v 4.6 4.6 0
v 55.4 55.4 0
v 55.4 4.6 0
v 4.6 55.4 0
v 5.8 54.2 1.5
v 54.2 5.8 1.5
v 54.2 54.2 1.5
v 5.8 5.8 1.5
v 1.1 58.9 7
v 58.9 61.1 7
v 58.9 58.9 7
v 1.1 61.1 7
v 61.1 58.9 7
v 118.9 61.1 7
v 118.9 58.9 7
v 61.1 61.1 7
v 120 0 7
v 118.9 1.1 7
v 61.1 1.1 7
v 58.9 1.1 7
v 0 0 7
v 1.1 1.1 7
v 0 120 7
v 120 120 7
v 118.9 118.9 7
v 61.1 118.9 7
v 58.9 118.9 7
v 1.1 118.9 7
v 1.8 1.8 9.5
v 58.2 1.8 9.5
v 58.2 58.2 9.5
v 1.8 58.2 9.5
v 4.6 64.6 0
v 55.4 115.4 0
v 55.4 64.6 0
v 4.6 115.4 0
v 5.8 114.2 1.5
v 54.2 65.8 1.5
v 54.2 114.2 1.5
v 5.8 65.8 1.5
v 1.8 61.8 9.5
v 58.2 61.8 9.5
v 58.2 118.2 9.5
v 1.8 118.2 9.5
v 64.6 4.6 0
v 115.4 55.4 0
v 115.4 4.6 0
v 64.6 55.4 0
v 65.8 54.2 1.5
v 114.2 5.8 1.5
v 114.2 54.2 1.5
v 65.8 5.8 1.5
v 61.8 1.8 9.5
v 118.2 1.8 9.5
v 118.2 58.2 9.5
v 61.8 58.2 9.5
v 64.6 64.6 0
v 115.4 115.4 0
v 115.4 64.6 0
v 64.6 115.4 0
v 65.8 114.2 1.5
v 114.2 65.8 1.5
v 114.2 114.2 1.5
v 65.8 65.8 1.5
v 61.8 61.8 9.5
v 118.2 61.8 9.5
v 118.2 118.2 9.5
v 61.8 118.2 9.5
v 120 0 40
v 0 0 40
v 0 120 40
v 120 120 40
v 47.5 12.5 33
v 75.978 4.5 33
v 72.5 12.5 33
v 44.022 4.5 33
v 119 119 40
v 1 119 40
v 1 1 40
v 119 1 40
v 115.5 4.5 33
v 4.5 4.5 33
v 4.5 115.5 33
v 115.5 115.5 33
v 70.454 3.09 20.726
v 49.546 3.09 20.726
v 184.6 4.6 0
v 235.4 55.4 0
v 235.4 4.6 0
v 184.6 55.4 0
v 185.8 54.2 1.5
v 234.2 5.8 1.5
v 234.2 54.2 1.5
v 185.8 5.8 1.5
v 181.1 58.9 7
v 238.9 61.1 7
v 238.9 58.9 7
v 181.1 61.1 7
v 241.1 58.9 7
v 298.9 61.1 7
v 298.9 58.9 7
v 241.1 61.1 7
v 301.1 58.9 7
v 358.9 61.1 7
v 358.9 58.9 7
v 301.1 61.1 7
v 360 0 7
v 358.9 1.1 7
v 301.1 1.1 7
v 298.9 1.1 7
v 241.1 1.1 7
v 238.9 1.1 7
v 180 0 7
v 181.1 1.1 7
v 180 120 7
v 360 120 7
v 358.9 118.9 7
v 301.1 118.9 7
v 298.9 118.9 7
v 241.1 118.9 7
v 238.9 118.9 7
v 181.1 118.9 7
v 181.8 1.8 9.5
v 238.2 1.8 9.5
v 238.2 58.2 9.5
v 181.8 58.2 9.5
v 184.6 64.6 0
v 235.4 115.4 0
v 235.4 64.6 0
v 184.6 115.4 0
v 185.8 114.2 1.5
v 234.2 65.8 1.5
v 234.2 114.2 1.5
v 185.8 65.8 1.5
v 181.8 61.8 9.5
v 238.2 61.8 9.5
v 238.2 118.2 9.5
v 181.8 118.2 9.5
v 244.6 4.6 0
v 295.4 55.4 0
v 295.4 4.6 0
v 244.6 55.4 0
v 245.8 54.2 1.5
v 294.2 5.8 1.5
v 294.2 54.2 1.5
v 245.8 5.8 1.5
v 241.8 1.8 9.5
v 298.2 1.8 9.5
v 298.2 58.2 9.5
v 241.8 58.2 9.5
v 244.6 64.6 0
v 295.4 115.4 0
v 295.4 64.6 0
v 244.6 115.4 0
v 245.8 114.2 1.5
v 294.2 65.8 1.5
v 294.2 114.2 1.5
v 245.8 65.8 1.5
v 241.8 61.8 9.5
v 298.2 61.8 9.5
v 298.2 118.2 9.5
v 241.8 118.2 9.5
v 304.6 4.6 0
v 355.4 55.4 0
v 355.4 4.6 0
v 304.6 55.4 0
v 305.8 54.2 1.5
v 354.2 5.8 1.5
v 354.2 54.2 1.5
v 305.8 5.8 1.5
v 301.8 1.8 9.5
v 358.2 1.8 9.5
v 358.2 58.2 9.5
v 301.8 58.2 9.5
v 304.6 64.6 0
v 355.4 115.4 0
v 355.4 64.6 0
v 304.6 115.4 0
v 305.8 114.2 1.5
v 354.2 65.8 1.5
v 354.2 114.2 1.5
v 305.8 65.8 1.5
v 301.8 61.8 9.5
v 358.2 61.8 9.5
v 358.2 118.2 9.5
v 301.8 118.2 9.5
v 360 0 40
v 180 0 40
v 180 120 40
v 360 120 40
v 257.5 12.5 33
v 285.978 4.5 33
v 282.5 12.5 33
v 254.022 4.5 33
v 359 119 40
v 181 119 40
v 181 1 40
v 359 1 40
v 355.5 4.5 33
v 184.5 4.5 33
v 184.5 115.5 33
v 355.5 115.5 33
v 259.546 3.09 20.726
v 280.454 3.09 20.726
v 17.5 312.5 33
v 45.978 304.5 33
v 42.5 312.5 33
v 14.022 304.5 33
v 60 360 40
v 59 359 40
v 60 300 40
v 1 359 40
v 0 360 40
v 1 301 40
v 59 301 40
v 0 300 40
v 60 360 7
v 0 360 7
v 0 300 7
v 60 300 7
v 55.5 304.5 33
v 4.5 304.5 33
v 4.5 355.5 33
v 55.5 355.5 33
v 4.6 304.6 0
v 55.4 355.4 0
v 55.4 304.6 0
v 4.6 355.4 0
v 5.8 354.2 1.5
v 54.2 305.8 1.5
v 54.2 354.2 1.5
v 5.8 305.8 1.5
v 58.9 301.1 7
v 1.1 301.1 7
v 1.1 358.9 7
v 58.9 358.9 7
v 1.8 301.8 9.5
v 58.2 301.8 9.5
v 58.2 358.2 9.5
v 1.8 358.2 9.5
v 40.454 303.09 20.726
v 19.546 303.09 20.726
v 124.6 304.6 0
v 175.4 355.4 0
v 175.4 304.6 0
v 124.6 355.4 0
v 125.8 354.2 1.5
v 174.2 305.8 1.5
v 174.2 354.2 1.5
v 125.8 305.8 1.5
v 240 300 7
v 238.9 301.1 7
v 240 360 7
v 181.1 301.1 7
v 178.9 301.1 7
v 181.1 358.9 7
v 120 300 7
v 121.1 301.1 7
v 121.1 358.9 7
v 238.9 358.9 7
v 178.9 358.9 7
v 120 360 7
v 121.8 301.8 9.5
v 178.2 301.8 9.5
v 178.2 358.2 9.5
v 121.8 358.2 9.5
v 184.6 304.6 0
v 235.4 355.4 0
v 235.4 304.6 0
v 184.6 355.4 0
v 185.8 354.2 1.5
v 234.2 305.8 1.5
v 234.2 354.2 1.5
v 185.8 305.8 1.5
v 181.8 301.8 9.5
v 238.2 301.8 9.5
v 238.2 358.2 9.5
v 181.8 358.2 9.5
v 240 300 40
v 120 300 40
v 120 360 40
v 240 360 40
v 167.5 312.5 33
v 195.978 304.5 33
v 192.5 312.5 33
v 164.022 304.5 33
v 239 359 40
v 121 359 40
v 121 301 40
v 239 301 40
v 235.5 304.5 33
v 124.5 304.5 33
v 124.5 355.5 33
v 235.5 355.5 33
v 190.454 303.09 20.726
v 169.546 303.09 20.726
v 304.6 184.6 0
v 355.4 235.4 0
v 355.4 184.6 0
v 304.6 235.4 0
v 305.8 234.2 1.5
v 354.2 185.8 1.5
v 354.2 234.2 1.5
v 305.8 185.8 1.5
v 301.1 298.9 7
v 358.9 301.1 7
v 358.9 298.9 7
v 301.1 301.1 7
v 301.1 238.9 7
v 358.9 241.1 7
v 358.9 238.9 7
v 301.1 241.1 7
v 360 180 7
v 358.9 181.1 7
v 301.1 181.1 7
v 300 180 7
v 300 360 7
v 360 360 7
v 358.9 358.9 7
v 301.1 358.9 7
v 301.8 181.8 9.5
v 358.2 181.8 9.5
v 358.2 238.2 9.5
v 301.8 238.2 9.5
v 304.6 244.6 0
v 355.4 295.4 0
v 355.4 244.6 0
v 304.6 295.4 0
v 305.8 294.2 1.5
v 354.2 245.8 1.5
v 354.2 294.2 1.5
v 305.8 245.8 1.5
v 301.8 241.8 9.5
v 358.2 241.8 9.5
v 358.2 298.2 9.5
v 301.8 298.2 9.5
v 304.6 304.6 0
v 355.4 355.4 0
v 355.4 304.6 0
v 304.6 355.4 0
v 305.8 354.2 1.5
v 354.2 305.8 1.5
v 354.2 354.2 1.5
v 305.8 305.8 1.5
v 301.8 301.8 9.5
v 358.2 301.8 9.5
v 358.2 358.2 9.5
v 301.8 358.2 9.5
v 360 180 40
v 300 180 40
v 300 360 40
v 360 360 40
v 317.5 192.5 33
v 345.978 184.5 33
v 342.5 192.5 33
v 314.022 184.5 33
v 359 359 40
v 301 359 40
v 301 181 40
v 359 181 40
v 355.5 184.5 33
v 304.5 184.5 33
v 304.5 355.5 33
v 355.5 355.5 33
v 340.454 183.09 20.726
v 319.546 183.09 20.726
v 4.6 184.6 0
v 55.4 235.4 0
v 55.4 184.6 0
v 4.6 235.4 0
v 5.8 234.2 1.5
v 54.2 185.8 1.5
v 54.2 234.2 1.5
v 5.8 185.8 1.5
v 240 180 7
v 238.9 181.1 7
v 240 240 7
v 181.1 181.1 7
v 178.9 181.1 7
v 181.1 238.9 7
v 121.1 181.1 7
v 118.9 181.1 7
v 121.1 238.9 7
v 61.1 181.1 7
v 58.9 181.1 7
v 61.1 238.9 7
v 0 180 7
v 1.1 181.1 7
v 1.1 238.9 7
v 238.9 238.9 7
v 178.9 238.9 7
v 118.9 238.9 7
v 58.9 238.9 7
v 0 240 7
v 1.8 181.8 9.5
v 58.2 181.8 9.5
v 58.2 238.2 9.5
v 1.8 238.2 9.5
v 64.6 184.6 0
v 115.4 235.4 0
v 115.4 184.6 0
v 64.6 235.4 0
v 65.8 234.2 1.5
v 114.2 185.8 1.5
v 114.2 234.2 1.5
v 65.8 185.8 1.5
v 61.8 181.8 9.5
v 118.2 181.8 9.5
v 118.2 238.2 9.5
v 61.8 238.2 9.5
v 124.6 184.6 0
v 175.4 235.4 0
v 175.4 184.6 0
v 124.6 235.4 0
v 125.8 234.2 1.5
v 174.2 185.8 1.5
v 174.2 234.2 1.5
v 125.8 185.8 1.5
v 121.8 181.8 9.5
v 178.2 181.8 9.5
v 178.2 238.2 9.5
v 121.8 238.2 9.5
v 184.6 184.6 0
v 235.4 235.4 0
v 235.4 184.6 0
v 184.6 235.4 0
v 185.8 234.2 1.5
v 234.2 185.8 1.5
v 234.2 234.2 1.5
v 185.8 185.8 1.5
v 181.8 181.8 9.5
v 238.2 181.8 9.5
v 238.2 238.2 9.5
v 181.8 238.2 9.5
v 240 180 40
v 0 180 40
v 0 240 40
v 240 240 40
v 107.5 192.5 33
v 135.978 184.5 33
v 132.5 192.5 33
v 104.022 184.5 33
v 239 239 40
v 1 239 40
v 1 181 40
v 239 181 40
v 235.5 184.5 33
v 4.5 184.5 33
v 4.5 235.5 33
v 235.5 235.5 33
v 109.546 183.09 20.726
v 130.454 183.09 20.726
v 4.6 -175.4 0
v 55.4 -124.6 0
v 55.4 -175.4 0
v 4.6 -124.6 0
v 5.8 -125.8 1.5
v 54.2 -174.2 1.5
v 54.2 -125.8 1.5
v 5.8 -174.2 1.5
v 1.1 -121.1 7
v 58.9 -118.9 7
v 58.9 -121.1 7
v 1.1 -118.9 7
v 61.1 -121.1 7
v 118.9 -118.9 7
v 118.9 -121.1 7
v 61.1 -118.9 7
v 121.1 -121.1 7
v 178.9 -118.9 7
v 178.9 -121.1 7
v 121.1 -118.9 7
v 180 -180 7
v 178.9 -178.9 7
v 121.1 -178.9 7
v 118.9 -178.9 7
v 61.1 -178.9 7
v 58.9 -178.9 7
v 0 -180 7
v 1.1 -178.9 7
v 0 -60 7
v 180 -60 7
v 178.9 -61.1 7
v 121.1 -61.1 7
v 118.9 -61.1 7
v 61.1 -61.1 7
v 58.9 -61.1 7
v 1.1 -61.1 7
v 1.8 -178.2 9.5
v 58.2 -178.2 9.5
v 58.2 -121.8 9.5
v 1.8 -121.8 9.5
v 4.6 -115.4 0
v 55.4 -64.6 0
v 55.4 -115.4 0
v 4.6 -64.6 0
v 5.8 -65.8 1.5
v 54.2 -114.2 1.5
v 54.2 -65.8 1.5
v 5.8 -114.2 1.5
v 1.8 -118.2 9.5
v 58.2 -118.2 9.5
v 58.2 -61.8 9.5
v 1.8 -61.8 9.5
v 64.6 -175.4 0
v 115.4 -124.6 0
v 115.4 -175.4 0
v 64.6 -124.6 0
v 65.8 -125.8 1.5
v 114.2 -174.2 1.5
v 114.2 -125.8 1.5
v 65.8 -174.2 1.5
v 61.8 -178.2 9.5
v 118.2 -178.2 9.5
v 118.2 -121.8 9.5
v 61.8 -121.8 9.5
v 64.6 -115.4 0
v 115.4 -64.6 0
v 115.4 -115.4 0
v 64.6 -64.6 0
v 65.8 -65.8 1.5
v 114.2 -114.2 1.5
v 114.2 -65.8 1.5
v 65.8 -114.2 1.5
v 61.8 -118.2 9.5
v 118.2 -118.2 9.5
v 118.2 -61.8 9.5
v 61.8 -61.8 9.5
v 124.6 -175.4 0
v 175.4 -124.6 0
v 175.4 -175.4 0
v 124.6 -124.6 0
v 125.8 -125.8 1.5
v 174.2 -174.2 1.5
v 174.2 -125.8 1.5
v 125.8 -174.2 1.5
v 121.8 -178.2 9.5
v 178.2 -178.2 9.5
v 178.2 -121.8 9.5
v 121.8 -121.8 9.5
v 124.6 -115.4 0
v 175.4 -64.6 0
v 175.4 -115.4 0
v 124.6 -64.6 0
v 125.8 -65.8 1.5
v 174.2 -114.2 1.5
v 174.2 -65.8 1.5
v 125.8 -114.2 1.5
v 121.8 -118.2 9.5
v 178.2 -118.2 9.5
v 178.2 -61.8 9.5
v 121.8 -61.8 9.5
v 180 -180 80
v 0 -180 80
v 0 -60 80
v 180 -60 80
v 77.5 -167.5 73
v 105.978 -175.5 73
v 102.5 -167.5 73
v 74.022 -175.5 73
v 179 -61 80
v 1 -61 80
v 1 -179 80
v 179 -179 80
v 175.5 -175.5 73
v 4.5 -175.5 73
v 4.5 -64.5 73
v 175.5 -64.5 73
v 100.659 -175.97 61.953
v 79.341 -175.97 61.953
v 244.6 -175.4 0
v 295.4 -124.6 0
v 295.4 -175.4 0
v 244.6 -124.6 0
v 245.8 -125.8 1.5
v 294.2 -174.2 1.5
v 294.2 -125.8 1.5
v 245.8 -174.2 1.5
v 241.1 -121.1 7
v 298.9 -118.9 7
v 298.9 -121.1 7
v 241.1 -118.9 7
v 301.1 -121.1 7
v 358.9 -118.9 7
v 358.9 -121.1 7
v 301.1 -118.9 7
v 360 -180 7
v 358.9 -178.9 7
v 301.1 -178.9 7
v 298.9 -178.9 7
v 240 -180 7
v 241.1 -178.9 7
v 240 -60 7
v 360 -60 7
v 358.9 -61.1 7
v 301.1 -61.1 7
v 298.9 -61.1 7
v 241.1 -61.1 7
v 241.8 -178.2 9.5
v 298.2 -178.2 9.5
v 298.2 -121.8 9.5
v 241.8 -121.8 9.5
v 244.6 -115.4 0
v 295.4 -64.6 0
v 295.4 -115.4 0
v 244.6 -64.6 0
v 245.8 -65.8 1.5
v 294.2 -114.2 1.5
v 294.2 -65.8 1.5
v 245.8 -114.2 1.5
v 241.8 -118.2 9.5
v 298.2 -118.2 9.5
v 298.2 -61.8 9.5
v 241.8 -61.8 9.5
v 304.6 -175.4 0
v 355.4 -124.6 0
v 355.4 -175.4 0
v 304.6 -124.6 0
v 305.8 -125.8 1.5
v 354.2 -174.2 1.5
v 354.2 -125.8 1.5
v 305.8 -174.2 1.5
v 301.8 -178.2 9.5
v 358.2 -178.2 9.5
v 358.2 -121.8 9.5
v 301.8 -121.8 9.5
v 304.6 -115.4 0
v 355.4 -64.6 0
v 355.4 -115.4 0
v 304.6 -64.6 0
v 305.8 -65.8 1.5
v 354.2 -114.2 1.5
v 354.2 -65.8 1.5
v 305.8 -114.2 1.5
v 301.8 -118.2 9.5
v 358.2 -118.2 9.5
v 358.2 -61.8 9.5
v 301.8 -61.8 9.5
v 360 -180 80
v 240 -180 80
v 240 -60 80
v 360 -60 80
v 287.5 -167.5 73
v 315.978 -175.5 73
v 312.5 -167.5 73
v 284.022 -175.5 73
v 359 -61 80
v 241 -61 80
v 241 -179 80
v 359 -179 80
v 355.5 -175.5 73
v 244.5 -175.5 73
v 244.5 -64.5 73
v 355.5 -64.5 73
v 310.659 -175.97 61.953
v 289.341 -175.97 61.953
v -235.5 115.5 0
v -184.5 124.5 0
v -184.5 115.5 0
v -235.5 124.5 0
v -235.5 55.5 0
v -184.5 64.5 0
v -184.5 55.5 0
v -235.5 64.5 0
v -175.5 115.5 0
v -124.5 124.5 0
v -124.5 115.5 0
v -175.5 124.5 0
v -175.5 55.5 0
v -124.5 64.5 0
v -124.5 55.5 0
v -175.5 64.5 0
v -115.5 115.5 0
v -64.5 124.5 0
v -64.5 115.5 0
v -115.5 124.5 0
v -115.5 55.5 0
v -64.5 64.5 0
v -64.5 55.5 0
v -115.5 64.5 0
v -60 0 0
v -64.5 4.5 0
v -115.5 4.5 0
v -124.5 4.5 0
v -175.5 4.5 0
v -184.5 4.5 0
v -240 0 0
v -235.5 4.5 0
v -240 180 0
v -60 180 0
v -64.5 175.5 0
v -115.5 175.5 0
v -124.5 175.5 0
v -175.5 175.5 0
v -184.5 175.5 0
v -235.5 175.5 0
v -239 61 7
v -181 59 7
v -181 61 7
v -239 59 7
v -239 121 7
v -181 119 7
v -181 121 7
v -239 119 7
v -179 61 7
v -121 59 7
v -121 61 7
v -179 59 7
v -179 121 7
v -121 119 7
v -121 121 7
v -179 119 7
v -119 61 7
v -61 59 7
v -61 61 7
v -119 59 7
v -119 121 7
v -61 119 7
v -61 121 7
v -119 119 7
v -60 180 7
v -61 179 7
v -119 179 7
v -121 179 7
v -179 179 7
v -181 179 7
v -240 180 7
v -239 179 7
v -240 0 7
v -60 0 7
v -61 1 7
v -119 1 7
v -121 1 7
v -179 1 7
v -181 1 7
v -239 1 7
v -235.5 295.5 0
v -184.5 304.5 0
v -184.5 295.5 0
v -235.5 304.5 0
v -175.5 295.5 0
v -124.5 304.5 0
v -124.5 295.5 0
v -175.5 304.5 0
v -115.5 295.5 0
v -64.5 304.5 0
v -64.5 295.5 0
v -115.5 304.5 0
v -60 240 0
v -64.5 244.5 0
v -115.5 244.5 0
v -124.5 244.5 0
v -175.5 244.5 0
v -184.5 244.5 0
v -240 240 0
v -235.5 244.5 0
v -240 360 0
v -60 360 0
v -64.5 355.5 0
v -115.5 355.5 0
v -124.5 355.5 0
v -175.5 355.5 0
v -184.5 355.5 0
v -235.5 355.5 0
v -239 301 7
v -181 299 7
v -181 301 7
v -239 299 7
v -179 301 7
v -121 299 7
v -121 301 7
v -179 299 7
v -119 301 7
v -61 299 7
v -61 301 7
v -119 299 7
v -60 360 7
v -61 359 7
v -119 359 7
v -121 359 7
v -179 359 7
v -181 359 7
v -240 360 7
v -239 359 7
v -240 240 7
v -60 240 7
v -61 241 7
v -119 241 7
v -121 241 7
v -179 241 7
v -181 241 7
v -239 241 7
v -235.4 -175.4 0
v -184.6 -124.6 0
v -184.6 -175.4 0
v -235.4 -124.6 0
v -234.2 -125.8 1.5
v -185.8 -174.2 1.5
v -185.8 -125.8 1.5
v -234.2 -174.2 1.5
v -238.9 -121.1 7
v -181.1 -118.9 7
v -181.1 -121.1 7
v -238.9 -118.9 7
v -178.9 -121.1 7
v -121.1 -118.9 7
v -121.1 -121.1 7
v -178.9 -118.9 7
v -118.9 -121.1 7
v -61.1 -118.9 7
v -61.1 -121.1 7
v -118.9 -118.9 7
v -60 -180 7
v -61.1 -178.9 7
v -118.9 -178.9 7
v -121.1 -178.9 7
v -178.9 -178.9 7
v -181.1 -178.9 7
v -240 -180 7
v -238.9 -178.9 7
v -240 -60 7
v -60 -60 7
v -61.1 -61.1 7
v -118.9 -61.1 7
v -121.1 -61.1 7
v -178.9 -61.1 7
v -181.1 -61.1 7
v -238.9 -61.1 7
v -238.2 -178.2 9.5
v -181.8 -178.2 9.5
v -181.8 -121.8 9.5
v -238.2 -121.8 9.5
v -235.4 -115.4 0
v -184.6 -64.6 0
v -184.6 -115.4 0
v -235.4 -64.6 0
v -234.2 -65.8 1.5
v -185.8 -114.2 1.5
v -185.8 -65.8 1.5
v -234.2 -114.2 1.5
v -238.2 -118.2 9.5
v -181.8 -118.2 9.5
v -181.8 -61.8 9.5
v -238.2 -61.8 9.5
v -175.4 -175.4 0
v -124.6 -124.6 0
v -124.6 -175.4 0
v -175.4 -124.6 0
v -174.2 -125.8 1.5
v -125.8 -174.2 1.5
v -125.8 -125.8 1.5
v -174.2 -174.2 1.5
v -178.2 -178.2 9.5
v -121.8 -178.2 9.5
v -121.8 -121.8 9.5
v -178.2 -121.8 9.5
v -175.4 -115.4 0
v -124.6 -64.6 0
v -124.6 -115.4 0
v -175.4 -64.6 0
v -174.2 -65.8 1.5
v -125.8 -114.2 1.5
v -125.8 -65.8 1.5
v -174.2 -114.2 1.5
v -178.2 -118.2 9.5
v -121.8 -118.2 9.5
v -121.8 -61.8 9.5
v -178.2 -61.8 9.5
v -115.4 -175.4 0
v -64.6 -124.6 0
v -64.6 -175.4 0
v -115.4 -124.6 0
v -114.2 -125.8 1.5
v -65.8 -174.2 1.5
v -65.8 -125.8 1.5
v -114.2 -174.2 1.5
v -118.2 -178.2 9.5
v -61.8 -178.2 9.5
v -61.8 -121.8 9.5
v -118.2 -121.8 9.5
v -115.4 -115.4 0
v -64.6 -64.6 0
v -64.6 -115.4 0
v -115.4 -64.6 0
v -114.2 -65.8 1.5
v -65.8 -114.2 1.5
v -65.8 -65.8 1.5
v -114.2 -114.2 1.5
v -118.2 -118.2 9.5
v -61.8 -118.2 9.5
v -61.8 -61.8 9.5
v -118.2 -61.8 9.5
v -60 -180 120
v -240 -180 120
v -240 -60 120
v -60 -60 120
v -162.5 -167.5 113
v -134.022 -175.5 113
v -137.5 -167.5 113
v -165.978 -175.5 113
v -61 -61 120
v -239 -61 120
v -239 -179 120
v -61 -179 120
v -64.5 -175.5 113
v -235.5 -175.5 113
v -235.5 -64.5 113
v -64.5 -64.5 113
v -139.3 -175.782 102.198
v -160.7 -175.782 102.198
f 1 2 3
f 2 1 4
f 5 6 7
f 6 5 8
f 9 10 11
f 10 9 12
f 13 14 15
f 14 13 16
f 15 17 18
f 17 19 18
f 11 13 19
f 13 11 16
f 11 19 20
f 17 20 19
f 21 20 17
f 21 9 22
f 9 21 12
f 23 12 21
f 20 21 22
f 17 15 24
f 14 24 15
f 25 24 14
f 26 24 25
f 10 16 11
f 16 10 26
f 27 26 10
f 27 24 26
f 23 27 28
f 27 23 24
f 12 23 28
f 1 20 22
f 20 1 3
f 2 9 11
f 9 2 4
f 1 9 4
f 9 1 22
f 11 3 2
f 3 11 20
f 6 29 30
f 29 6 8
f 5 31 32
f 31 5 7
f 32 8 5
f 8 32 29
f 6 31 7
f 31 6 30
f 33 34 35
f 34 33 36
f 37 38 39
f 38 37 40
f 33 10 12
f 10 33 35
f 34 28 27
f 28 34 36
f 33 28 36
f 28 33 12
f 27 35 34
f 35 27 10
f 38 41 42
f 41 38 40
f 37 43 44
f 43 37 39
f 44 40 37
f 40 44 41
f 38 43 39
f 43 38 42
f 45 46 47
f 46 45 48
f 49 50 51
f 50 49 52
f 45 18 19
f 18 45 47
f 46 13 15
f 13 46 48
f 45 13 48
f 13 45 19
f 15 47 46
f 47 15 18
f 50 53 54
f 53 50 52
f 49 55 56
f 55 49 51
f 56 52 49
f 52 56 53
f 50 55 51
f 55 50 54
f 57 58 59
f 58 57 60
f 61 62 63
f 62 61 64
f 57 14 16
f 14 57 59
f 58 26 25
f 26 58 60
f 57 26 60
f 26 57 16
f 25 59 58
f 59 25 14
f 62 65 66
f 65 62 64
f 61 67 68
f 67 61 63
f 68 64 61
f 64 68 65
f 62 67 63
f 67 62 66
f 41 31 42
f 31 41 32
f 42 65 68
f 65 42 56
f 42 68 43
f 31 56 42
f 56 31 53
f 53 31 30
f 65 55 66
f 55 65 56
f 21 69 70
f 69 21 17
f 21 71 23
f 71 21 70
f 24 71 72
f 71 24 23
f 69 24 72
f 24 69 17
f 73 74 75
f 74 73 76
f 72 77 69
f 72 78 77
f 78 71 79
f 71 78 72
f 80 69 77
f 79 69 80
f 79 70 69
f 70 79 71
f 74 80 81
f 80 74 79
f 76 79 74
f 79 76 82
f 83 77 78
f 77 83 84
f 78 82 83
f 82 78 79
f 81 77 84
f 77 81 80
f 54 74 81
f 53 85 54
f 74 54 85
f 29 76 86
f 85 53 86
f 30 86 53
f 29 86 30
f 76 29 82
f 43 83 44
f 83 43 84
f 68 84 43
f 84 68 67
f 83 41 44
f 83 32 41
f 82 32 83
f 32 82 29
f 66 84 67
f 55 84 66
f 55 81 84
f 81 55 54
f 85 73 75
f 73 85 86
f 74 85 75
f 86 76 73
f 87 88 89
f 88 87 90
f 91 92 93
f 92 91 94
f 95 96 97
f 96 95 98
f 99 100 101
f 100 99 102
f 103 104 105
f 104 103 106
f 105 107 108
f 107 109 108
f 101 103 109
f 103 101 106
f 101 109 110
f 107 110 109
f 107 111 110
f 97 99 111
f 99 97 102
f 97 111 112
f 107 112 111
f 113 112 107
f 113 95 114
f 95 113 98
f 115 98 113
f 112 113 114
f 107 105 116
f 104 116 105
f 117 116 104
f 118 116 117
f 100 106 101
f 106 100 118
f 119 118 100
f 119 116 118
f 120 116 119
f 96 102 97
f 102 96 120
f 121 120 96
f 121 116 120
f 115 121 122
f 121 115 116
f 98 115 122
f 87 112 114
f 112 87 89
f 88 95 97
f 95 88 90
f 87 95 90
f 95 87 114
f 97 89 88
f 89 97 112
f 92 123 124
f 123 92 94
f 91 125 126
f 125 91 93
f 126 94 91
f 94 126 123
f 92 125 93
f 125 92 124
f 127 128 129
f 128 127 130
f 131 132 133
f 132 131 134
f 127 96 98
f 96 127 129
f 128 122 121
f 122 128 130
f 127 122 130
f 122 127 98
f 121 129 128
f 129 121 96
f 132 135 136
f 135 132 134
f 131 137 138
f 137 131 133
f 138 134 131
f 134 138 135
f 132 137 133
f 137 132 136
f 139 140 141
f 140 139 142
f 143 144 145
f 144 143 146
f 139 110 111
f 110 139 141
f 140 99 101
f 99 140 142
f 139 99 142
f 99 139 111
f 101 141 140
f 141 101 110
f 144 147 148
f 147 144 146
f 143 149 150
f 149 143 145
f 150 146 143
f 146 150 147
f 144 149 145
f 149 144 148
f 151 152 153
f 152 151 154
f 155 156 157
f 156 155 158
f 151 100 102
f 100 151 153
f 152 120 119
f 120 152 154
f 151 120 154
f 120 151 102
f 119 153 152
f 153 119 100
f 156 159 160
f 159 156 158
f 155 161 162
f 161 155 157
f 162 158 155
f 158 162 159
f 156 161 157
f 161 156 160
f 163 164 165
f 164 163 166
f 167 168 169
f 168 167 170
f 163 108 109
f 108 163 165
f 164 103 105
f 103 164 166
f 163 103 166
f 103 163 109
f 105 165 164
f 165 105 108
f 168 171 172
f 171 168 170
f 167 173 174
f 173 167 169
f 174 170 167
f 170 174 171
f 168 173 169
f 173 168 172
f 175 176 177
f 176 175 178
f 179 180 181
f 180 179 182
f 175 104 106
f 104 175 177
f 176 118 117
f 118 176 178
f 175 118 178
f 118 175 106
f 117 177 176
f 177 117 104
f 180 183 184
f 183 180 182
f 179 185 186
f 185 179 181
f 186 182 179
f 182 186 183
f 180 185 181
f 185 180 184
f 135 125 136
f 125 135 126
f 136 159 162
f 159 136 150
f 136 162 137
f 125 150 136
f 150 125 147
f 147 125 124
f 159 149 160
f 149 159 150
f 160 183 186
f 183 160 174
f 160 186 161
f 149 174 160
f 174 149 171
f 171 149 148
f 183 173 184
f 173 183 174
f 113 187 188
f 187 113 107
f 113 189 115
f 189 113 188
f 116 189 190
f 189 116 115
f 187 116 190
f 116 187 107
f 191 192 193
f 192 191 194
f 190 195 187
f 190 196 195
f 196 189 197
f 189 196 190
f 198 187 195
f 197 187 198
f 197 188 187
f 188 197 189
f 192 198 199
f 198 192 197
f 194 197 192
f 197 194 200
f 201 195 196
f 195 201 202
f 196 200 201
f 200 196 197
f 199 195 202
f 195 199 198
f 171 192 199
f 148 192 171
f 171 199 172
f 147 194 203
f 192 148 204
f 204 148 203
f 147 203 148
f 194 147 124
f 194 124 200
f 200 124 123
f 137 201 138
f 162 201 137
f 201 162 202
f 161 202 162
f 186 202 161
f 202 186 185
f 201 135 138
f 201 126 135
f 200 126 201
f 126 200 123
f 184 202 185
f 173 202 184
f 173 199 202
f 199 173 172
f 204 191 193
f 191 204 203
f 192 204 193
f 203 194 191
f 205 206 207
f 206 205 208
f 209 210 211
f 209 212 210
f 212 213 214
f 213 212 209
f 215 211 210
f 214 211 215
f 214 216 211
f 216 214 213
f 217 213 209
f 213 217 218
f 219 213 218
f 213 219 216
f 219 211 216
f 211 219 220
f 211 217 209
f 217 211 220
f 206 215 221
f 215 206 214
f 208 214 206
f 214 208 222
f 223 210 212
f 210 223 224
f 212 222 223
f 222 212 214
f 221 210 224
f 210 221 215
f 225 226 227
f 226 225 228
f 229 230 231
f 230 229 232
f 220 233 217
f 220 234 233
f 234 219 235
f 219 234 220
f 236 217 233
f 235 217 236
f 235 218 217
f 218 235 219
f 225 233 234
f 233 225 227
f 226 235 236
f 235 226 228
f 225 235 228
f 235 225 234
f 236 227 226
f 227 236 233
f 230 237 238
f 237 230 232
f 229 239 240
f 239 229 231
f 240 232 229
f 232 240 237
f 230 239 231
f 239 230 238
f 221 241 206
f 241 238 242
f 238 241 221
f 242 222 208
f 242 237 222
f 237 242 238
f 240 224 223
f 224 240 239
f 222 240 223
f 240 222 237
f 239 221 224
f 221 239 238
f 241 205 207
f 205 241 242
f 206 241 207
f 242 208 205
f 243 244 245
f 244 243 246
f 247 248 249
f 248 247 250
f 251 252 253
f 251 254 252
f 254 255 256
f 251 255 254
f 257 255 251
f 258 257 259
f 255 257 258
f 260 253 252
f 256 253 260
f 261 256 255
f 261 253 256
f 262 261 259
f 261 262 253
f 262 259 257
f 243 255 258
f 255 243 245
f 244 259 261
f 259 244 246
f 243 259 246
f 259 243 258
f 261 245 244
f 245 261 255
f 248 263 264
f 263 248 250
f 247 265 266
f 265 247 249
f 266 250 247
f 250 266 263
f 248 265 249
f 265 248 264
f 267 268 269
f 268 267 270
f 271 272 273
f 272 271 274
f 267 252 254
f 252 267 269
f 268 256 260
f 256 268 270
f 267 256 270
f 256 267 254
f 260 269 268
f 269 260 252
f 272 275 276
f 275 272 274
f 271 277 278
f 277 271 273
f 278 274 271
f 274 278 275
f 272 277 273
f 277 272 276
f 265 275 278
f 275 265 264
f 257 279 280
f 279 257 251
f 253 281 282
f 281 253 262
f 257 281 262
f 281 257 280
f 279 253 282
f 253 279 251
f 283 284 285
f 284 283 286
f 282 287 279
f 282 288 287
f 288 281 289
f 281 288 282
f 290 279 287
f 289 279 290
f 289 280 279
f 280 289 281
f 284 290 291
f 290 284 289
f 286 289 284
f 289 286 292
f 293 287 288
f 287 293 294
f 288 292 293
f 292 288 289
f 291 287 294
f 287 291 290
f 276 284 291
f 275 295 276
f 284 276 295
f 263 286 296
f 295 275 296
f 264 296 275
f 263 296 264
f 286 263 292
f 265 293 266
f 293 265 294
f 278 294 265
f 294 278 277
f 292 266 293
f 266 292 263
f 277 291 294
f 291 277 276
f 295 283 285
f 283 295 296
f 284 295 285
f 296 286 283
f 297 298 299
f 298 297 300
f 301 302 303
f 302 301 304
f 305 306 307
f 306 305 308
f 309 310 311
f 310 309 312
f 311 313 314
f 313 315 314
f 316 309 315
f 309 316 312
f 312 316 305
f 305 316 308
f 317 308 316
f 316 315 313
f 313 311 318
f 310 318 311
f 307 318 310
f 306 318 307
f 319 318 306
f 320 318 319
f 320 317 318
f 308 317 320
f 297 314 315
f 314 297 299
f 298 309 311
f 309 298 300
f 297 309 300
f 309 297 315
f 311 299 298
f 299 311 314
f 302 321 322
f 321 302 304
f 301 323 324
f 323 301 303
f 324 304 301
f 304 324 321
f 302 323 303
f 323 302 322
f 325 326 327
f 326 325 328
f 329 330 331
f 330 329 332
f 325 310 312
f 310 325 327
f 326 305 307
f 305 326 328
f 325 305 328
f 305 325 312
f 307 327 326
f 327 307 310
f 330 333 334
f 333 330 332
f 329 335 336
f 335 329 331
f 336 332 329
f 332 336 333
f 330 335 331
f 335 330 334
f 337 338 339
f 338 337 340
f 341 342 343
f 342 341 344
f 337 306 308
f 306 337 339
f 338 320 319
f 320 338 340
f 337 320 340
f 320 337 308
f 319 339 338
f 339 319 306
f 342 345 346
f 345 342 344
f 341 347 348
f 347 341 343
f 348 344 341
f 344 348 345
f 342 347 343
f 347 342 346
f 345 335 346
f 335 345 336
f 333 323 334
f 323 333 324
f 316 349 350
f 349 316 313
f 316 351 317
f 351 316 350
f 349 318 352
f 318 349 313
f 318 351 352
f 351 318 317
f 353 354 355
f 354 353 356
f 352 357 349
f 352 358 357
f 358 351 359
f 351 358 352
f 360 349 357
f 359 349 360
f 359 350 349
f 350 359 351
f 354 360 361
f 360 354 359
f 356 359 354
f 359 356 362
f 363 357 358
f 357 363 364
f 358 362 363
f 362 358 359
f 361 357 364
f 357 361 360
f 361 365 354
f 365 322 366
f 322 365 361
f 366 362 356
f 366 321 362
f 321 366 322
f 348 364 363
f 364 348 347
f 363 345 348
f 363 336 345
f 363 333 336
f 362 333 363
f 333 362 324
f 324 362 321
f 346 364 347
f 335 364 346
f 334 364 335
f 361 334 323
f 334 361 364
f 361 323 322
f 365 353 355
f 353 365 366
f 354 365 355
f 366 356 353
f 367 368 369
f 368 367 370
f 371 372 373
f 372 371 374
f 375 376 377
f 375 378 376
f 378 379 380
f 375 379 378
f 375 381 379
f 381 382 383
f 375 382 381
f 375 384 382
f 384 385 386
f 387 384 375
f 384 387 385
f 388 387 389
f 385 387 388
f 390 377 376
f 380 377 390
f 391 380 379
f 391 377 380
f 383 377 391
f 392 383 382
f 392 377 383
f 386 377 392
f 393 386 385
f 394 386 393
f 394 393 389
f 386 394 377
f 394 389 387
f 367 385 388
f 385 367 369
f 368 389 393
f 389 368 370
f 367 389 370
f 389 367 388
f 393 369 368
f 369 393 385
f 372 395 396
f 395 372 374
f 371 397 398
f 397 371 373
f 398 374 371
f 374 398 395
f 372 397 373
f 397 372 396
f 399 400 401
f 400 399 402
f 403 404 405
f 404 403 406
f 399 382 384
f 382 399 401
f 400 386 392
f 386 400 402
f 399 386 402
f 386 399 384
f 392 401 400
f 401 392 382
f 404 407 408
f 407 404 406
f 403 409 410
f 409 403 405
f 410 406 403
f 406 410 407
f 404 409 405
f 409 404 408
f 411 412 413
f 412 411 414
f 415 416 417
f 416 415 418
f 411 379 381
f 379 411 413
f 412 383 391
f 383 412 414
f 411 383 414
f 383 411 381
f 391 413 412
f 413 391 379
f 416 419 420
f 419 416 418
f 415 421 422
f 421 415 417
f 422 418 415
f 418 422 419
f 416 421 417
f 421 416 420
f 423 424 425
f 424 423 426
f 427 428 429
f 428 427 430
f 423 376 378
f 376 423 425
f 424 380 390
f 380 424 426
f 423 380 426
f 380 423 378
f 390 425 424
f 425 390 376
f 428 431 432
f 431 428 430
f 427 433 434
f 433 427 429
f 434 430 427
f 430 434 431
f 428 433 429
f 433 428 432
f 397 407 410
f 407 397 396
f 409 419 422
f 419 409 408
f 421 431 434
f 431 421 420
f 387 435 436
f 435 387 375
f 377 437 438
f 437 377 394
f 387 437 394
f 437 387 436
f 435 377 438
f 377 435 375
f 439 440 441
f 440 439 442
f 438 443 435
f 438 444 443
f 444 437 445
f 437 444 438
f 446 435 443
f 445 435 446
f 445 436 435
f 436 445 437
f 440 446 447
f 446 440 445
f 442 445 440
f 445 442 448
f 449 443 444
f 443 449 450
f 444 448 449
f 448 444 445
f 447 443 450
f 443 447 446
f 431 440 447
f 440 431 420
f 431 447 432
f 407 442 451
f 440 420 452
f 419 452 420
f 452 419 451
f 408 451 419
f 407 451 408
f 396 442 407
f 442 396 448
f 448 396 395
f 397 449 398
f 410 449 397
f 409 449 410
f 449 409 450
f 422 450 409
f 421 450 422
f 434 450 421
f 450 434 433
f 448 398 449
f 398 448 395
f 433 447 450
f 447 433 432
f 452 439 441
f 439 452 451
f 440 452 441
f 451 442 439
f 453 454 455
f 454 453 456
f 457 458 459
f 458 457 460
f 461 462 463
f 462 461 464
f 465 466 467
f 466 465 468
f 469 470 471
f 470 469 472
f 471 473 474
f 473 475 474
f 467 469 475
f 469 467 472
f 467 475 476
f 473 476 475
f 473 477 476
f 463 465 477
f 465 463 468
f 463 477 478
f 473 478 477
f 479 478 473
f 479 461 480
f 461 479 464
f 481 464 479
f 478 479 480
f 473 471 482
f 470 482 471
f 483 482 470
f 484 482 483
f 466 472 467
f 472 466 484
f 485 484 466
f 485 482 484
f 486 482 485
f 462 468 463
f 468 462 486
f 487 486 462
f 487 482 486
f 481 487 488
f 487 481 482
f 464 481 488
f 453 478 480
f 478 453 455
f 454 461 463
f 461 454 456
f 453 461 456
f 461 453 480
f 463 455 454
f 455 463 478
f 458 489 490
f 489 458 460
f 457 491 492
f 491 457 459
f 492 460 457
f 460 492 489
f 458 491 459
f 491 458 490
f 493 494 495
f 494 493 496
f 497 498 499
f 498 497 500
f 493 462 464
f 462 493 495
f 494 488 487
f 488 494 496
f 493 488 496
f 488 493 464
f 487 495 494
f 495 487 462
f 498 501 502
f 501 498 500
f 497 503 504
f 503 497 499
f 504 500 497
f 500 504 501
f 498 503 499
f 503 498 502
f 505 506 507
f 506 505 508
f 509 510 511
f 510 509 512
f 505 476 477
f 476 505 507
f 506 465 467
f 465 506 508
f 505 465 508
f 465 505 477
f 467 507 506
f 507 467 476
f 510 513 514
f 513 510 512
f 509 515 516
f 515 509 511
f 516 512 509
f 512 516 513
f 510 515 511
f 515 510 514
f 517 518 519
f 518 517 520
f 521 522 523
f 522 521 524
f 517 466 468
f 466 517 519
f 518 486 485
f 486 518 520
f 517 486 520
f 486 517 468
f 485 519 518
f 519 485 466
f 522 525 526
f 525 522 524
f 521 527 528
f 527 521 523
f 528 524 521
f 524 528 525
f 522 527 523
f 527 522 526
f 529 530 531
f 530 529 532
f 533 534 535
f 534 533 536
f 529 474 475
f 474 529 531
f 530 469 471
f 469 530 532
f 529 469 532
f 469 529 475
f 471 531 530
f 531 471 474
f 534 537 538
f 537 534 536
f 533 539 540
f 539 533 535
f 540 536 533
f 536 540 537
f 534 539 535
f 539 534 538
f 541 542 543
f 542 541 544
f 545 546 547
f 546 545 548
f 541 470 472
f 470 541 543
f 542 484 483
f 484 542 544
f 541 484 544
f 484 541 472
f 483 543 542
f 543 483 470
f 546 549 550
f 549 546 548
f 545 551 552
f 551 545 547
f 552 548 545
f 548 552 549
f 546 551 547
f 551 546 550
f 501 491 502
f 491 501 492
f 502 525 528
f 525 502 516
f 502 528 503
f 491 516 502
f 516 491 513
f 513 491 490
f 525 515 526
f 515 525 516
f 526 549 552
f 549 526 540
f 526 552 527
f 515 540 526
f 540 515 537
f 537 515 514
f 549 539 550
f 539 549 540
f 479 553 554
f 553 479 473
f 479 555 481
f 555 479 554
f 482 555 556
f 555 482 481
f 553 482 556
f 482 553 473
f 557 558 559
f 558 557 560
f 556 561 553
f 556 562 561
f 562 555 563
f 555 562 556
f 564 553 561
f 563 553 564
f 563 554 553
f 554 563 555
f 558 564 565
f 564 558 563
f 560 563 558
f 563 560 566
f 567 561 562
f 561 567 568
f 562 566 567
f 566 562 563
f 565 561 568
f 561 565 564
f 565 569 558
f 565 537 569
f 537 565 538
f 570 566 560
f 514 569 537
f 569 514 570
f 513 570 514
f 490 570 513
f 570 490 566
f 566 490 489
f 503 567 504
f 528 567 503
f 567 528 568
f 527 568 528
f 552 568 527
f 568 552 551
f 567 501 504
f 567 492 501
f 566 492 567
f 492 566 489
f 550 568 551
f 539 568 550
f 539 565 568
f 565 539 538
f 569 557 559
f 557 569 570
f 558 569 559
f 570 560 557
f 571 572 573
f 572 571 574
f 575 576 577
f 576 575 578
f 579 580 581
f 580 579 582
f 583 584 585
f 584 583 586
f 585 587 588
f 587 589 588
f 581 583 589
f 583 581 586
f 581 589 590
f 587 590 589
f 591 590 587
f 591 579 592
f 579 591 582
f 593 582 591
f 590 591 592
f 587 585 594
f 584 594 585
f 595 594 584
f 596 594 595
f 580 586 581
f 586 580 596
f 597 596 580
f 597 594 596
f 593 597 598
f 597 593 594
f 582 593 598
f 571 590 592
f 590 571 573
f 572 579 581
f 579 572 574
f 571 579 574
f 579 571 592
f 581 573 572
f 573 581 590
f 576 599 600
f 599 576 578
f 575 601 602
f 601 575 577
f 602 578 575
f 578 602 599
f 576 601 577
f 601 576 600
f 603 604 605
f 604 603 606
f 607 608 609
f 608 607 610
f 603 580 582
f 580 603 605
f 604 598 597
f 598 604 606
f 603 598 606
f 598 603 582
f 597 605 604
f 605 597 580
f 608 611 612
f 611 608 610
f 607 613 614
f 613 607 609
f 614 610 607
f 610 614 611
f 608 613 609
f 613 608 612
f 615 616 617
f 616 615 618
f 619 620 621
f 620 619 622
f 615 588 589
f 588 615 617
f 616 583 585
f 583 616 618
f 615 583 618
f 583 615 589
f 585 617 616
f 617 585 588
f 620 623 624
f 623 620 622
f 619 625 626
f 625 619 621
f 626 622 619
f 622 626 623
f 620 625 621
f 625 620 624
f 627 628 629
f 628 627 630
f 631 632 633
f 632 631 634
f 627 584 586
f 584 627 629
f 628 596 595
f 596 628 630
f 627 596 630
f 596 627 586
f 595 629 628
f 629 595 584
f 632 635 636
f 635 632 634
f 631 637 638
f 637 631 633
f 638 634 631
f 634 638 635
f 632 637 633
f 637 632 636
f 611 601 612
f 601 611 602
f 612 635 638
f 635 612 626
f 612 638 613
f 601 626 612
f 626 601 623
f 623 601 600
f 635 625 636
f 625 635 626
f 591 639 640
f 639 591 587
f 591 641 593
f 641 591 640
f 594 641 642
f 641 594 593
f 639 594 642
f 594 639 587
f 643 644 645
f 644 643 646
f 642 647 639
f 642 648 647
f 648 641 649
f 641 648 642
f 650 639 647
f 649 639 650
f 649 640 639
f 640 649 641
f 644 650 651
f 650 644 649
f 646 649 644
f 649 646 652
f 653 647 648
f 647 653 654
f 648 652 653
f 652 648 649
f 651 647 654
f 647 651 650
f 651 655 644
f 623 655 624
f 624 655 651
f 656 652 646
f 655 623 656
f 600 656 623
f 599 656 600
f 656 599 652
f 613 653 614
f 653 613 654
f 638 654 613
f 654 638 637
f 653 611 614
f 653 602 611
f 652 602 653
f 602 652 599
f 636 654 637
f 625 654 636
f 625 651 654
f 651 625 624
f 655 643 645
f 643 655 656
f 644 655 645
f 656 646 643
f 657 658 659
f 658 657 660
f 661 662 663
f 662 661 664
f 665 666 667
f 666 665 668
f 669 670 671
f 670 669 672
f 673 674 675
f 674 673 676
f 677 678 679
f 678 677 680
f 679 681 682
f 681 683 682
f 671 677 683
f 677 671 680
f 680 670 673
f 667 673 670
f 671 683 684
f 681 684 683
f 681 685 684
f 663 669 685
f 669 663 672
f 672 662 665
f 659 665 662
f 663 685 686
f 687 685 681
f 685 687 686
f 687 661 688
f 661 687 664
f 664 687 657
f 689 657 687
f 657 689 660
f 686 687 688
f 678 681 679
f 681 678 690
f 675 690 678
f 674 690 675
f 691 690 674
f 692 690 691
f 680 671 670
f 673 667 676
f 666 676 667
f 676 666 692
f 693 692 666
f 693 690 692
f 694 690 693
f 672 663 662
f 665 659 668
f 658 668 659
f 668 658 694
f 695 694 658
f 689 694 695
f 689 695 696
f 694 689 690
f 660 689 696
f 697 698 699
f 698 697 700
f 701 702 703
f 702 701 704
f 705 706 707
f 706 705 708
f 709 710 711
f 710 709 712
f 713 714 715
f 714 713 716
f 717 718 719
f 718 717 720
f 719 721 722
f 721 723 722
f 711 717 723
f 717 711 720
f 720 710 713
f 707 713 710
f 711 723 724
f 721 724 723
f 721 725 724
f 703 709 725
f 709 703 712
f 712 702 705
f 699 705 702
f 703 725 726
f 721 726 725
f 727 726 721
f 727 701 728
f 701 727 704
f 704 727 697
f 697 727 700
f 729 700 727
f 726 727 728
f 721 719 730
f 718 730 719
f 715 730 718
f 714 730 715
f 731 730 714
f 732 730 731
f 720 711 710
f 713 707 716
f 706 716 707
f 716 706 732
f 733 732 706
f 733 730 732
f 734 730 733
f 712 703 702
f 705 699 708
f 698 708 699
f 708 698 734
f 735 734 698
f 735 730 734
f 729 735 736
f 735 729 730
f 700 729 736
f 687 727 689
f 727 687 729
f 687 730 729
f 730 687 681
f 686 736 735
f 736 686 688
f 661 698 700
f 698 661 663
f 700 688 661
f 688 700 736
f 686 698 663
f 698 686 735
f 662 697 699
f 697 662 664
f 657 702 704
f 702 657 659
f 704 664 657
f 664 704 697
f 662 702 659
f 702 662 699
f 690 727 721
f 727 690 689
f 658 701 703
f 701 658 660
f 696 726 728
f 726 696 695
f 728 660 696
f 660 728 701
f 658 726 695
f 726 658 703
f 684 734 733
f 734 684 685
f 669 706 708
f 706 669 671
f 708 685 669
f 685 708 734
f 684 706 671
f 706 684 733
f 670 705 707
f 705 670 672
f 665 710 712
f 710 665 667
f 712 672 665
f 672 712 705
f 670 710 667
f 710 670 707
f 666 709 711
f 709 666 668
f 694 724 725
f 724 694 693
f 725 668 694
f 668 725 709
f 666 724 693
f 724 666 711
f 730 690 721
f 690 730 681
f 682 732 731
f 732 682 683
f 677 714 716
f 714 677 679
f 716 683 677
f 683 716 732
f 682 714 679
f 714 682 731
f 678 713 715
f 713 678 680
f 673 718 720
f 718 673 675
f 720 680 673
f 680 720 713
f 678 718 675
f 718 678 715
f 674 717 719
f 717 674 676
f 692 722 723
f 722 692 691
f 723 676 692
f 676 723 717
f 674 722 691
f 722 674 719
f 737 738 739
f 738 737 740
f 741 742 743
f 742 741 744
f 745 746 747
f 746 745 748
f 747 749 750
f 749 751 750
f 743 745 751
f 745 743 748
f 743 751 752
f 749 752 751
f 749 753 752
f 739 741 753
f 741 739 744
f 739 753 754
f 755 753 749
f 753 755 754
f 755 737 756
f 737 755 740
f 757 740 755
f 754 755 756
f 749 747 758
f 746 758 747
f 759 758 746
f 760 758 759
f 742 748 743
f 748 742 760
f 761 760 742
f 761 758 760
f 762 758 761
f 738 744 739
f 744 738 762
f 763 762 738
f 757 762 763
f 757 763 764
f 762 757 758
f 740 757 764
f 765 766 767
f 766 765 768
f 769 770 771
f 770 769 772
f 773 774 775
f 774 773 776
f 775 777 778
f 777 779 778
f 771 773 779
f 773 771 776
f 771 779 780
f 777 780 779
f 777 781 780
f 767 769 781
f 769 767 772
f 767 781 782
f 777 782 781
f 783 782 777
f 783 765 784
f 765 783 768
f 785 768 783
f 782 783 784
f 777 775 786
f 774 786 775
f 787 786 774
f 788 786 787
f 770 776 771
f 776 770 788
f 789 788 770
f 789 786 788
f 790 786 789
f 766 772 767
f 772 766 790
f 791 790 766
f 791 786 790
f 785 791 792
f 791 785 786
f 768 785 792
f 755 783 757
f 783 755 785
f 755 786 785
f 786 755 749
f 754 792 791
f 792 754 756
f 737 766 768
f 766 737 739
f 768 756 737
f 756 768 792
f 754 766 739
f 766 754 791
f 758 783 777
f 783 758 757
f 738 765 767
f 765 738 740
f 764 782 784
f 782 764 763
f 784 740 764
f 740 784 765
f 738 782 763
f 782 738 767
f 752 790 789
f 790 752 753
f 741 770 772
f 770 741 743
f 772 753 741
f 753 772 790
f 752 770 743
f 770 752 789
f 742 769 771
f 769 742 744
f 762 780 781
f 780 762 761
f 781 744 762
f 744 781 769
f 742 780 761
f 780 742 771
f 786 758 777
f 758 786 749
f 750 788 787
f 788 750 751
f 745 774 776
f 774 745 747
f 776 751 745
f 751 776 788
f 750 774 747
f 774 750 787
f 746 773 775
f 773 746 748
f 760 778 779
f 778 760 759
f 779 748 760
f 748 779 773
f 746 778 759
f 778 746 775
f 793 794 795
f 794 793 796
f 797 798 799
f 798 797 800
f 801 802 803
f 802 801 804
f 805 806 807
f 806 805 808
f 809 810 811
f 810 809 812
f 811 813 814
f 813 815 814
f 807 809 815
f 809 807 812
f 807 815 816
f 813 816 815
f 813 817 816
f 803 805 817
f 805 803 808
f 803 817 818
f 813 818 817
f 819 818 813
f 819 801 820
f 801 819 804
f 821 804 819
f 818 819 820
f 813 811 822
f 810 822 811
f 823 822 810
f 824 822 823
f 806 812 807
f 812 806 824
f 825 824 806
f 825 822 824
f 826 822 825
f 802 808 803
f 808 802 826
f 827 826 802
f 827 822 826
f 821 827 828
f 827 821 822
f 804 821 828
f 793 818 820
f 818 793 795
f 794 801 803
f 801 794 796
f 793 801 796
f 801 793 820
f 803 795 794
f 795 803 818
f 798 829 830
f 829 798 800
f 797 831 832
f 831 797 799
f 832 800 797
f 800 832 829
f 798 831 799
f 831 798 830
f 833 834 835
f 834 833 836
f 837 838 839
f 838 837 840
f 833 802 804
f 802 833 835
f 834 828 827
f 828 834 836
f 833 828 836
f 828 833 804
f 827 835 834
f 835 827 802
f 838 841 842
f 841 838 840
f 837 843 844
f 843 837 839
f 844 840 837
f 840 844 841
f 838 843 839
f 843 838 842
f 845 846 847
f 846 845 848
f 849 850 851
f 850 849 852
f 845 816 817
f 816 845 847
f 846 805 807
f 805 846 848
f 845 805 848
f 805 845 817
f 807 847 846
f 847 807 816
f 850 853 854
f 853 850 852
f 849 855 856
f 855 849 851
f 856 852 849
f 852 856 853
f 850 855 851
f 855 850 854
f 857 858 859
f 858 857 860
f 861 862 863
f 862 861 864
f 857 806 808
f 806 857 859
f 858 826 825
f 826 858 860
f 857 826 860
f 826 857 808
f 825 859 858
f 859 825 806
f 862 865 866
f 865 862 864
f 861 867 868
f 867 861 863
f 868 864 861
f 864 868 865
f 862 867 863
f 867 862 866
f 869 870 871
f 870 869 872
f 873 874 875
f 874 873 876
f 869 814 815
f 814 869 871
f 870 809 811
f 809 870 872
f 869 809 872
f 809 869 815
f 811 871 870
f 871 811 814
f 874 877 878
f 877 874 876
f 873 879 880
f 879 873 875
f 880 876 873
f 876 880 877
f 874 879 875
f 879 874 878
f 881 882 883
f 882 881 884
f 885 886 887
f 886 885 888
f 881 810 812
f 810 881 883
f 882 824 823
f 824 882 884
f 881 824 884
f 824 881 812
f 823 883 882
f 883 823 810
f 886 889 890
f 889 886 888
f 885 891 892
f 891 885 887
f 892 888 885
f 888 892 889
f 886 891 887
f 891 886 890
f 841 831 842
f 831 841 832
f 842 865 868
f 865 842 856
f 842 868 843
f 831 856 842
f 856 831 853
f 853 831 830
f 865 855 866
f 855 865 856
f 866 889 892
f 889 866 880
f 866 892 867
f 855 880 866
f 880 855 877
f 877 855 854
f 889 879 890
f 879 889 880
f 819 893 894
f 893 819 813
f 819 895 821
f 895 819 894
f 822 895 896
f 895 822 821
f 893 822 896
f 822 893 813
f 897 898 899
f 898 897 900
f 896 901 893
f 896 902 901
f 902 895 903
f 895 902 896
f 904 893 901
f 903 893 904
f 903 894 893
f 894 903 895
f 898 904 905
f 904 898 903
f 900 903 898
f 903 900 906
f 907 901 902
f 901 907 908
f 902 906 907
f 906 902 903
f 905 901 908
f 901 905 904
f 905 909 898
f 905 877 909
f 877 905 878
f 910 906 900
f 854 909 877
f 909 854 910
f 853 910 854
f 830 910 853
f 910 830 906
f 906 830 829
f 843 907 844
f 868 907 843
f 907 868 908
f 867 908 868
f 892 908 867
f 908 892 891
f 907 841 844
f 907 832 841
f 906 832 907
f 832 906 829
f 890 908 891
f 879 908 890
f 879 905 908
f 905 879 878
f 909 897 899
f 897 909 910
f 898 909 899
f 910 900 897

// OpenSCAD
// file: dimensions.scad
///////////////////// YOU CAN CHANGE THE FOLLOWING VALUES //////////////////////

// 1u (1 unit) is the base size. Each part can be created with a size of
// a x b x h. The following variables define the size of the outer dimensions.

// size for 1u (in x & y)
u_size = 60;
// height for 1u (in z)
u_height = 40;
// minimum main-wall thickness
u_wall_thickness = 1;
// bottom thickness
u_bottom_thickness = 1.5;


// The following variables define the dimensions of the connector bar at the
// bottom of a box.

// height
u_connector_height = 7;
// width
u_connector_width = 3.5;
// wall thickness
u_connector_wall_thickness = 1.5;

// clearance
u_connector_clearance = 0.1;

// additional height of connector bar
u_connector_ridge_height = 2.5;


// The following values define the dimensions of the label

// width
label_width = 25;
// width at the bottom. This creates a nice shape.
label_width_bottom = 20;
// width at the back. This creates a nice shape.
label_width_back = 35;
// depth
label_depth = 8;
// height
label_height = 15;



////////////////////// DO NOT CHANGE THE FOLLOWING VALUES //////////////////////

connector_angle = atan(u_connector_width / u_connector_height);

tmp_a = tan(connector_angle) * u_connector_wall_thickness;
tmp_h = cos(connector_angle) * u_connector_wall_thickness;
tmp_b = cos(connector_angle) * tmp_h;
connector_bar_plane_width = tmp_a + tmp_b;
// main file
include <dimensions.scad>

// Connector bar at the bottom of a box. This part helps with stacking of boxes.
module connector_bar() {
    connector_offset = u_wall_thickness + u_connector_clearance;
    
    additional_offset = tan(connector_angle) * (u_connector_height - u_bottom_thickness);
    middle_offset = connector_offset + connector_bar_plane_width + additional_offset;
    
    points = [
        // bottom
        [u_connector_width + connector_offset, u_connector_width + connector_offset, 0],
        [u_size - u_connector_width - connector_offset, u_connector_width + connector_offset, 0],
        [u_size - u_connector_width - connector_offset, u_size - u_connector_width - connector_offset, 0],
        [u_connector_width + connector_offset, u_size - u_connector_width - connector_offset, 0],

        // top - outer
        [connector_offset, connector_offset, u_connector_height],
        [u_size - connector_offset, connector_offset, u_connector_height],
        [u_size - connector_offset, u_size - connector_offset, u_connector_height],
        [connector_offset, u_size - connector_offset, u_connector_height],

        // top - inner
        [connector_offset + connector_bar_plane_width, connector_offset + connector_bar_plane_width, u_connector_height],
        [u_size - connector_offset - connector_bar_plane_width, connector_offset + connector_bar_plane_width, u_connector_height],
        [u_size - connector_offset - connector_bar_plane_width, u_size - connector_offset - connector_bar_plane_width, u_connector_height],
        [connector_offset + connector_bar_plane_width, u_size - connector_offset - connector_bar_plane_width, u_connector_height],

        // middle
        [middle_offset, middle_offset, u_bottom_thickness],
        [u_size - middle_offset, middle_offset, u_bottom_thickness],
        [u_size - middle_offset, u_size - middle_offset, u_bottom_thickness],
        [middle_offset, u_size - middle_offset, u_bottom_thickness],
    ];
    faces = [
        [1, 2, 3, 0], // bottom bottom
        [15, 14, 13, 12], // bottom top
        [8, 9, 5, 4], // top front
        [10, 11, 7, 6], // top back
        [11, 8, 4, 7], // top left
        [9, 10, 6, 5], // top right
        [4, 5, 1, 0], // front outer
        [6, 7, 3, 2], // back outer
        [7, 4, 0, 3], // left outer
        [5, 6, 2, 1], // right outer
        [12, 13, 9, 8], // front inner
        [14, 15, 11, 10], // back inner
        [15, 12, 8, 11], // left inner
        [13, 14, 10, 9] // right inner
    ];
    polyhedron(points, faces);
}


// Creates the connector bars for size a x b.
module nxn_connector_bar(a, b) {
    for(i = [0 : 1 : a - 1]) {
        for(j = [0 : 1 : b - 1]) {
            translate([i*u_size, j*u_size, 0])
                connector_bar();
        }
    }
}


// Additional part on top of the connector bar. This part makes sure that the
// bottom of larger parts is properly connected and strong.
module connector_bar_ridge() {
    connector_offset = u_wall_thickness + u_connector_clearance;
    
    tmp_a = u_connector_ridge_height / tan(90 - connector_angle);
    tmp_top_width = connector_offset + connector_bar_plane_width - tmp_a;
    
    bottom_offset = connector_offset + connector_bar_plane_width;
    
    top_offset = tmp_top_width > u_connector_wall_thickness ? tmp_top_width : u_connector_wall_thickness;
    
    points = [
        // bottom outer
        [0, 0, 0],
        [u_size, 0, 0],
        [u_size, u_size, 0],
        [0, u_size, 0],
    
        // bottom inner
        [bottom_offset, bottom_offset, 0],
        [u_size - bottom_offset, bottom_offset, 0],
        [u_size - bottom_offset, u_size - bottom_offset, 0],
        [bottom_offset, u_size - bottom_offset, 0],
    
        // top outer
        [0, 0, u_connector_ridge_height],
        [u_size, 0, u_connector_ridge_height],
        [u_size, u_size, u_connector_ridge_height],
        [0, u_size, u_connector_ridge_height],
    
        // top inner
        [top_offset, top_offset, u_connector_ridge_height],
        [u_size - top_offset, top_offset, u_connector_ridge_height],
        [u_size - top_offset, u_size - top_offset, u_connector_ridge_height],
        [top_offset, u_size - top_offset, u_connector_ridge_height],
    ];
    faces = [
        [0, 1, 5, 4], // bottom front
        [2, 3, 7, 6], // bottom back
        [3, 0, 4, 7], // bottom left
        [1, 2, 6, 5], // bottom right
        
        [9, 8, 12, 13], // top front
        [11, 10, 14, 15], // top back
        [8, 11, 15, 12], // top left
        [9, 13, 14, 10], // top right
        
        [0, 8, 9, 1], // front outer
        [2, 10, 11, 3], // back outer
        [0, 3, 11, 8], // left outer
        [1, 9, 10, 2], // right outer
        
        [4, 5, 13, 12], // front inner
        [6, 7, 15, 14], // back inner
        [12, 15, 7, 4], // left inner
        [14, 13, 5, 6], // right inner
    ];
    polyhedron(points, faces);
}


// Creates a connector bar ridge for size a x b.
module nxn_connector_bar_ridge(a, b) {
    for(i = [0 : 1 : a - 1]) {
        for(j = [0 : 1 : b - 1]) {
            translate([i*u_size, j*u_size, 0])
                connector_bar_ridge();
        }
    }
}


// Main wall of a box of size a x b x h.
module nxn_outer_wall(a, b, h) {
    size_a = a * u_size;
    size_b = b * u_size;
    
    connector_offset = u_wall_thickness + u_connector_clearance;
    height = h*u_height - u_connector_height - u_connector_ridge_height - u_connector_height;
    
    tmp_a = u_connector_ridge_height / tan(90 - connector_angle);
    tmp_top_width = connector_offset + connector_bar_plane_width - tmp_a;
    
    top_offset = tmp_top_width > u_connector_wall_thickness ? tmp_top_width : u_connector_wall_thickness;
    
    points = [
        // bottom outer
        [0, 0, 0],
        [size_a, 0, 0],
        [size_a, size_b, 0],
        [0, size_b, 0],
    
        // bottom inner - TODO
        [top_offset, top_offset, 0],
        [size_a - top_offset, top_offset, 0],
        [size_a - top_offset, size_b - top_offset, 0],
        [top_offset, size_b - top_offset, 0],
    
        // top outer
        [0, 0, height],
        [size_a, 0, height],
        [size_a, size_b, height],
        [0, size_b, height],
    
        // top inner
        [u_wall_thickness + u_connector_width, u_wall_thickness + u_connector_width, height],
        [size_a - u_wall_thickness - u_connector_width, u_wall_thickness + u_connector_width, height],
        [size_a - u_wall_thickness - u_connector_width, size_b - u_wall_thickness - u_connector_width, height],
        [u_wall_thickness + u_connector_width, size_b - u_wall_thickness - u_connector_width, height],
    ];
    faces = [
        [1, 5, 4, 0], // bottom front
        [7, 6, 2, 3], // bottom back
        [4, 7, 3, 0], // bottom left
        [6, 5, 1, 2], // bottom right
        
        [8, 9, 1, 0], // front outer
        [10, 11, 3, 2], // back outer
        [11, 8, 0, 3], // left outer
        [9, 10, 2, 1], // front outer
        
        [4, 5, 13, 12], // front inner
        [15, 14, 6, 7], // back inner
        [12, 15, 7, 4], // left inner
        [14, 13, 5, 6], // right inner
        
        [12, 13, 9, 8], // top front
        [14, 15, 11, 10], // top back
        [15, 12, 8, 11], // top left
        [13, 14, 10, 9], // top right
    ];
    polyhedron(points, faces);
}


// The connector slot allows another box to be stacked on the current box of
// size a x b.
module nxn_connector_slot(a, b) {
    size_a = a * u_size;
    size_b = b * u_size;
    
    // outer ring
    {
        linear_extrude(u_connector_height) {
            difference() {
                square([size_a, size_b]);
                translate([u_wall_thickness, u_wall_thickness])
                    square([size_a - 2*u_wall_thickness, size_b - 2*u_wall_thickness]);
            }
        }
    }
    // connector slot
    {
        points = [
        // bottom - outer
        [u_wall_thickness, u_wall_thickness, 0],
        [size_a - u_wall_thickness, u_wall_thickness, 0],
        [size_a - u_wall_thickness, size_b - u_wall_thickness, 0],
        [u_wall_thickness, size_b - u_wall_thickness, 0],
        
        // bottom - inner
        [u_wall_thickness + u_connector_width, u_wall_thickness + u_connector_width, 0],
        [size_a - u_wall_thickness - u_connector_width, u_wall_thickness + u_connector_width, 0],
        [size_a - u_wall_thickness - u_connector_width, size_b - u_wall_thickness - u_connector_width, 0],
        [u_wall_thickness + u_connector_width, size_b - u_wall_thickness - u_connector_width, 0],

        // top - outer
        [u_wall_thickness, u_wall_thickness, u_connector_height],
        [size_a - u_wall_thickness, u_wall_thickness, u_connector_height],
        [size_a - u_wall_thickness, size_b - u_wall_thickness, u_connector_height],
        [u_wall_thickness, size_b - u_wall_thickness, u_connector_height],
    ];
    faces = [
        [4, 5, 9, 8], // front inner
        [6, 7, 11, 10], // back inner
        [7, 4, 8, 11], // left inner
        [5, 6, 10, 9], // right inner
        
        [1, 0, 8, 9], // front outer
        [10, 11, 3, 2], // back outer
        [0, 3, 11, 8], // left outer
        [2, 1, 9, 10], // right outer
        
        [0, 1, 5, 4], // bottom front
        [2, 3, 7, 6], // bottom back
        [0, 4, 7, 3], // bottom left
        [1, 2, 6, 5], // bottom right
    ];
        polyhedron(points, faces);
    }
}


// This module creates a part for labeling. It also makes pulling the box out
// of a case easier.
module label() {
    translate([0, u_wall_thickness, 0]) {
        points = [
            // bottom
            [-(label_width_bottom - label_width) / 2, 0, 0],
            [(label_width_bottom - label_width) / 2 + label_width, 0, 0],

            // top
            [-(label_width_back - label_width) / 2, 0, label_height],
            [(label_width_back - label_width) / 2 + label_width, 0, label_height],
            [label_width, label_depth + u_connector_width, label_height],
            [0, label_depth + u_connector_width, label_height],
        ];
        faces = [
            [2, 3, 1, 0], // front
            [4, 5, 0, 1], // back
            [0, 5, 2], // left
            [1, 3, 4], // right
  
            [3, 2, 5, 4], // top
        ];
        polyhedron(points, faces);
    }
}


// This module creates a box of size a x b x h.
module nxn_unit(a, b, h) {
    size_a = a * u_size;
    size_b = b * u_size;
    height = h * u_height;

    nxn_connector_bar(a, b);

    translate([0, 0, u_connector_height])
        nxn_connector_bar_ridge(a, b);

    translate([0, 0, u_connector_height + u_connector_ridge_height])
        nxn_outer_wall(a, b, h);

    translate([0, 0, h*u_height - u_connector_height])
        nxn_connector_slot(a, b);
    
    translate([(size_a / 2) - (label_width / 2), 0, height - u_connector_height - label_height])
        label();
}


// This module creates the base connector slot mesh.
module nxn_connector_slot_mesh(a, b) {
    for(i = [0 : 1 : a - 1]) {
        for(j = [0 : 1 : b - 1]) {
            translate([i*u_size, j*u_size, 0])
                nxn_connector_slot(1, 1);
        }
    }
}





// For debugging: This cuts a box + mesh in half.
if(false) {
    difference() {
        union() {
            nxn_unit(1, 1, 1);
            //translate([0, 0, -2])
                //nxn_connector_slot_mesh(2, 1);
        }
        //translate([0, u_size / 2, -2])
            //cube([2*u_size, u_size / 2, 2*u_height + 2]);
    }
}


if(true) {
    translate([0, 0, 0]) nxn_unit(2, 2, 1);
    translate([3*u_size, 0, 0]) nxn_unit(3, 2, 1);

    translate([0, 5*u_size, 0]) nxn_unit(1, 1, 1);
    translate([2*u_size, 5*u_size, 0]) nxn_unit(2, 1, 1);

    translate([5*u_size, 3*u_size, 0]) nxn_unit(1, 3, 1);
    translate([0, 3*u_size, 0]) nxn_unit(4, 1, 1);

    translate([0, -3*u_size, 0]) nxn_unit(3, 2, 2);
    translate([4*u_size, -3*u_size, 0]) nxn_unit(2, 2, 2);

    translate([-4*u_size, 0, 0]) nxn_connector_slot_mesh(3, 3);
    translate([-4*u_size, 4*u_size, 0]) nxn_connector_slot_mesh(3, 2);

    translate([-4*u_size, -3*u_size, 0]) nxn_unit(3, 2, 3);
}
